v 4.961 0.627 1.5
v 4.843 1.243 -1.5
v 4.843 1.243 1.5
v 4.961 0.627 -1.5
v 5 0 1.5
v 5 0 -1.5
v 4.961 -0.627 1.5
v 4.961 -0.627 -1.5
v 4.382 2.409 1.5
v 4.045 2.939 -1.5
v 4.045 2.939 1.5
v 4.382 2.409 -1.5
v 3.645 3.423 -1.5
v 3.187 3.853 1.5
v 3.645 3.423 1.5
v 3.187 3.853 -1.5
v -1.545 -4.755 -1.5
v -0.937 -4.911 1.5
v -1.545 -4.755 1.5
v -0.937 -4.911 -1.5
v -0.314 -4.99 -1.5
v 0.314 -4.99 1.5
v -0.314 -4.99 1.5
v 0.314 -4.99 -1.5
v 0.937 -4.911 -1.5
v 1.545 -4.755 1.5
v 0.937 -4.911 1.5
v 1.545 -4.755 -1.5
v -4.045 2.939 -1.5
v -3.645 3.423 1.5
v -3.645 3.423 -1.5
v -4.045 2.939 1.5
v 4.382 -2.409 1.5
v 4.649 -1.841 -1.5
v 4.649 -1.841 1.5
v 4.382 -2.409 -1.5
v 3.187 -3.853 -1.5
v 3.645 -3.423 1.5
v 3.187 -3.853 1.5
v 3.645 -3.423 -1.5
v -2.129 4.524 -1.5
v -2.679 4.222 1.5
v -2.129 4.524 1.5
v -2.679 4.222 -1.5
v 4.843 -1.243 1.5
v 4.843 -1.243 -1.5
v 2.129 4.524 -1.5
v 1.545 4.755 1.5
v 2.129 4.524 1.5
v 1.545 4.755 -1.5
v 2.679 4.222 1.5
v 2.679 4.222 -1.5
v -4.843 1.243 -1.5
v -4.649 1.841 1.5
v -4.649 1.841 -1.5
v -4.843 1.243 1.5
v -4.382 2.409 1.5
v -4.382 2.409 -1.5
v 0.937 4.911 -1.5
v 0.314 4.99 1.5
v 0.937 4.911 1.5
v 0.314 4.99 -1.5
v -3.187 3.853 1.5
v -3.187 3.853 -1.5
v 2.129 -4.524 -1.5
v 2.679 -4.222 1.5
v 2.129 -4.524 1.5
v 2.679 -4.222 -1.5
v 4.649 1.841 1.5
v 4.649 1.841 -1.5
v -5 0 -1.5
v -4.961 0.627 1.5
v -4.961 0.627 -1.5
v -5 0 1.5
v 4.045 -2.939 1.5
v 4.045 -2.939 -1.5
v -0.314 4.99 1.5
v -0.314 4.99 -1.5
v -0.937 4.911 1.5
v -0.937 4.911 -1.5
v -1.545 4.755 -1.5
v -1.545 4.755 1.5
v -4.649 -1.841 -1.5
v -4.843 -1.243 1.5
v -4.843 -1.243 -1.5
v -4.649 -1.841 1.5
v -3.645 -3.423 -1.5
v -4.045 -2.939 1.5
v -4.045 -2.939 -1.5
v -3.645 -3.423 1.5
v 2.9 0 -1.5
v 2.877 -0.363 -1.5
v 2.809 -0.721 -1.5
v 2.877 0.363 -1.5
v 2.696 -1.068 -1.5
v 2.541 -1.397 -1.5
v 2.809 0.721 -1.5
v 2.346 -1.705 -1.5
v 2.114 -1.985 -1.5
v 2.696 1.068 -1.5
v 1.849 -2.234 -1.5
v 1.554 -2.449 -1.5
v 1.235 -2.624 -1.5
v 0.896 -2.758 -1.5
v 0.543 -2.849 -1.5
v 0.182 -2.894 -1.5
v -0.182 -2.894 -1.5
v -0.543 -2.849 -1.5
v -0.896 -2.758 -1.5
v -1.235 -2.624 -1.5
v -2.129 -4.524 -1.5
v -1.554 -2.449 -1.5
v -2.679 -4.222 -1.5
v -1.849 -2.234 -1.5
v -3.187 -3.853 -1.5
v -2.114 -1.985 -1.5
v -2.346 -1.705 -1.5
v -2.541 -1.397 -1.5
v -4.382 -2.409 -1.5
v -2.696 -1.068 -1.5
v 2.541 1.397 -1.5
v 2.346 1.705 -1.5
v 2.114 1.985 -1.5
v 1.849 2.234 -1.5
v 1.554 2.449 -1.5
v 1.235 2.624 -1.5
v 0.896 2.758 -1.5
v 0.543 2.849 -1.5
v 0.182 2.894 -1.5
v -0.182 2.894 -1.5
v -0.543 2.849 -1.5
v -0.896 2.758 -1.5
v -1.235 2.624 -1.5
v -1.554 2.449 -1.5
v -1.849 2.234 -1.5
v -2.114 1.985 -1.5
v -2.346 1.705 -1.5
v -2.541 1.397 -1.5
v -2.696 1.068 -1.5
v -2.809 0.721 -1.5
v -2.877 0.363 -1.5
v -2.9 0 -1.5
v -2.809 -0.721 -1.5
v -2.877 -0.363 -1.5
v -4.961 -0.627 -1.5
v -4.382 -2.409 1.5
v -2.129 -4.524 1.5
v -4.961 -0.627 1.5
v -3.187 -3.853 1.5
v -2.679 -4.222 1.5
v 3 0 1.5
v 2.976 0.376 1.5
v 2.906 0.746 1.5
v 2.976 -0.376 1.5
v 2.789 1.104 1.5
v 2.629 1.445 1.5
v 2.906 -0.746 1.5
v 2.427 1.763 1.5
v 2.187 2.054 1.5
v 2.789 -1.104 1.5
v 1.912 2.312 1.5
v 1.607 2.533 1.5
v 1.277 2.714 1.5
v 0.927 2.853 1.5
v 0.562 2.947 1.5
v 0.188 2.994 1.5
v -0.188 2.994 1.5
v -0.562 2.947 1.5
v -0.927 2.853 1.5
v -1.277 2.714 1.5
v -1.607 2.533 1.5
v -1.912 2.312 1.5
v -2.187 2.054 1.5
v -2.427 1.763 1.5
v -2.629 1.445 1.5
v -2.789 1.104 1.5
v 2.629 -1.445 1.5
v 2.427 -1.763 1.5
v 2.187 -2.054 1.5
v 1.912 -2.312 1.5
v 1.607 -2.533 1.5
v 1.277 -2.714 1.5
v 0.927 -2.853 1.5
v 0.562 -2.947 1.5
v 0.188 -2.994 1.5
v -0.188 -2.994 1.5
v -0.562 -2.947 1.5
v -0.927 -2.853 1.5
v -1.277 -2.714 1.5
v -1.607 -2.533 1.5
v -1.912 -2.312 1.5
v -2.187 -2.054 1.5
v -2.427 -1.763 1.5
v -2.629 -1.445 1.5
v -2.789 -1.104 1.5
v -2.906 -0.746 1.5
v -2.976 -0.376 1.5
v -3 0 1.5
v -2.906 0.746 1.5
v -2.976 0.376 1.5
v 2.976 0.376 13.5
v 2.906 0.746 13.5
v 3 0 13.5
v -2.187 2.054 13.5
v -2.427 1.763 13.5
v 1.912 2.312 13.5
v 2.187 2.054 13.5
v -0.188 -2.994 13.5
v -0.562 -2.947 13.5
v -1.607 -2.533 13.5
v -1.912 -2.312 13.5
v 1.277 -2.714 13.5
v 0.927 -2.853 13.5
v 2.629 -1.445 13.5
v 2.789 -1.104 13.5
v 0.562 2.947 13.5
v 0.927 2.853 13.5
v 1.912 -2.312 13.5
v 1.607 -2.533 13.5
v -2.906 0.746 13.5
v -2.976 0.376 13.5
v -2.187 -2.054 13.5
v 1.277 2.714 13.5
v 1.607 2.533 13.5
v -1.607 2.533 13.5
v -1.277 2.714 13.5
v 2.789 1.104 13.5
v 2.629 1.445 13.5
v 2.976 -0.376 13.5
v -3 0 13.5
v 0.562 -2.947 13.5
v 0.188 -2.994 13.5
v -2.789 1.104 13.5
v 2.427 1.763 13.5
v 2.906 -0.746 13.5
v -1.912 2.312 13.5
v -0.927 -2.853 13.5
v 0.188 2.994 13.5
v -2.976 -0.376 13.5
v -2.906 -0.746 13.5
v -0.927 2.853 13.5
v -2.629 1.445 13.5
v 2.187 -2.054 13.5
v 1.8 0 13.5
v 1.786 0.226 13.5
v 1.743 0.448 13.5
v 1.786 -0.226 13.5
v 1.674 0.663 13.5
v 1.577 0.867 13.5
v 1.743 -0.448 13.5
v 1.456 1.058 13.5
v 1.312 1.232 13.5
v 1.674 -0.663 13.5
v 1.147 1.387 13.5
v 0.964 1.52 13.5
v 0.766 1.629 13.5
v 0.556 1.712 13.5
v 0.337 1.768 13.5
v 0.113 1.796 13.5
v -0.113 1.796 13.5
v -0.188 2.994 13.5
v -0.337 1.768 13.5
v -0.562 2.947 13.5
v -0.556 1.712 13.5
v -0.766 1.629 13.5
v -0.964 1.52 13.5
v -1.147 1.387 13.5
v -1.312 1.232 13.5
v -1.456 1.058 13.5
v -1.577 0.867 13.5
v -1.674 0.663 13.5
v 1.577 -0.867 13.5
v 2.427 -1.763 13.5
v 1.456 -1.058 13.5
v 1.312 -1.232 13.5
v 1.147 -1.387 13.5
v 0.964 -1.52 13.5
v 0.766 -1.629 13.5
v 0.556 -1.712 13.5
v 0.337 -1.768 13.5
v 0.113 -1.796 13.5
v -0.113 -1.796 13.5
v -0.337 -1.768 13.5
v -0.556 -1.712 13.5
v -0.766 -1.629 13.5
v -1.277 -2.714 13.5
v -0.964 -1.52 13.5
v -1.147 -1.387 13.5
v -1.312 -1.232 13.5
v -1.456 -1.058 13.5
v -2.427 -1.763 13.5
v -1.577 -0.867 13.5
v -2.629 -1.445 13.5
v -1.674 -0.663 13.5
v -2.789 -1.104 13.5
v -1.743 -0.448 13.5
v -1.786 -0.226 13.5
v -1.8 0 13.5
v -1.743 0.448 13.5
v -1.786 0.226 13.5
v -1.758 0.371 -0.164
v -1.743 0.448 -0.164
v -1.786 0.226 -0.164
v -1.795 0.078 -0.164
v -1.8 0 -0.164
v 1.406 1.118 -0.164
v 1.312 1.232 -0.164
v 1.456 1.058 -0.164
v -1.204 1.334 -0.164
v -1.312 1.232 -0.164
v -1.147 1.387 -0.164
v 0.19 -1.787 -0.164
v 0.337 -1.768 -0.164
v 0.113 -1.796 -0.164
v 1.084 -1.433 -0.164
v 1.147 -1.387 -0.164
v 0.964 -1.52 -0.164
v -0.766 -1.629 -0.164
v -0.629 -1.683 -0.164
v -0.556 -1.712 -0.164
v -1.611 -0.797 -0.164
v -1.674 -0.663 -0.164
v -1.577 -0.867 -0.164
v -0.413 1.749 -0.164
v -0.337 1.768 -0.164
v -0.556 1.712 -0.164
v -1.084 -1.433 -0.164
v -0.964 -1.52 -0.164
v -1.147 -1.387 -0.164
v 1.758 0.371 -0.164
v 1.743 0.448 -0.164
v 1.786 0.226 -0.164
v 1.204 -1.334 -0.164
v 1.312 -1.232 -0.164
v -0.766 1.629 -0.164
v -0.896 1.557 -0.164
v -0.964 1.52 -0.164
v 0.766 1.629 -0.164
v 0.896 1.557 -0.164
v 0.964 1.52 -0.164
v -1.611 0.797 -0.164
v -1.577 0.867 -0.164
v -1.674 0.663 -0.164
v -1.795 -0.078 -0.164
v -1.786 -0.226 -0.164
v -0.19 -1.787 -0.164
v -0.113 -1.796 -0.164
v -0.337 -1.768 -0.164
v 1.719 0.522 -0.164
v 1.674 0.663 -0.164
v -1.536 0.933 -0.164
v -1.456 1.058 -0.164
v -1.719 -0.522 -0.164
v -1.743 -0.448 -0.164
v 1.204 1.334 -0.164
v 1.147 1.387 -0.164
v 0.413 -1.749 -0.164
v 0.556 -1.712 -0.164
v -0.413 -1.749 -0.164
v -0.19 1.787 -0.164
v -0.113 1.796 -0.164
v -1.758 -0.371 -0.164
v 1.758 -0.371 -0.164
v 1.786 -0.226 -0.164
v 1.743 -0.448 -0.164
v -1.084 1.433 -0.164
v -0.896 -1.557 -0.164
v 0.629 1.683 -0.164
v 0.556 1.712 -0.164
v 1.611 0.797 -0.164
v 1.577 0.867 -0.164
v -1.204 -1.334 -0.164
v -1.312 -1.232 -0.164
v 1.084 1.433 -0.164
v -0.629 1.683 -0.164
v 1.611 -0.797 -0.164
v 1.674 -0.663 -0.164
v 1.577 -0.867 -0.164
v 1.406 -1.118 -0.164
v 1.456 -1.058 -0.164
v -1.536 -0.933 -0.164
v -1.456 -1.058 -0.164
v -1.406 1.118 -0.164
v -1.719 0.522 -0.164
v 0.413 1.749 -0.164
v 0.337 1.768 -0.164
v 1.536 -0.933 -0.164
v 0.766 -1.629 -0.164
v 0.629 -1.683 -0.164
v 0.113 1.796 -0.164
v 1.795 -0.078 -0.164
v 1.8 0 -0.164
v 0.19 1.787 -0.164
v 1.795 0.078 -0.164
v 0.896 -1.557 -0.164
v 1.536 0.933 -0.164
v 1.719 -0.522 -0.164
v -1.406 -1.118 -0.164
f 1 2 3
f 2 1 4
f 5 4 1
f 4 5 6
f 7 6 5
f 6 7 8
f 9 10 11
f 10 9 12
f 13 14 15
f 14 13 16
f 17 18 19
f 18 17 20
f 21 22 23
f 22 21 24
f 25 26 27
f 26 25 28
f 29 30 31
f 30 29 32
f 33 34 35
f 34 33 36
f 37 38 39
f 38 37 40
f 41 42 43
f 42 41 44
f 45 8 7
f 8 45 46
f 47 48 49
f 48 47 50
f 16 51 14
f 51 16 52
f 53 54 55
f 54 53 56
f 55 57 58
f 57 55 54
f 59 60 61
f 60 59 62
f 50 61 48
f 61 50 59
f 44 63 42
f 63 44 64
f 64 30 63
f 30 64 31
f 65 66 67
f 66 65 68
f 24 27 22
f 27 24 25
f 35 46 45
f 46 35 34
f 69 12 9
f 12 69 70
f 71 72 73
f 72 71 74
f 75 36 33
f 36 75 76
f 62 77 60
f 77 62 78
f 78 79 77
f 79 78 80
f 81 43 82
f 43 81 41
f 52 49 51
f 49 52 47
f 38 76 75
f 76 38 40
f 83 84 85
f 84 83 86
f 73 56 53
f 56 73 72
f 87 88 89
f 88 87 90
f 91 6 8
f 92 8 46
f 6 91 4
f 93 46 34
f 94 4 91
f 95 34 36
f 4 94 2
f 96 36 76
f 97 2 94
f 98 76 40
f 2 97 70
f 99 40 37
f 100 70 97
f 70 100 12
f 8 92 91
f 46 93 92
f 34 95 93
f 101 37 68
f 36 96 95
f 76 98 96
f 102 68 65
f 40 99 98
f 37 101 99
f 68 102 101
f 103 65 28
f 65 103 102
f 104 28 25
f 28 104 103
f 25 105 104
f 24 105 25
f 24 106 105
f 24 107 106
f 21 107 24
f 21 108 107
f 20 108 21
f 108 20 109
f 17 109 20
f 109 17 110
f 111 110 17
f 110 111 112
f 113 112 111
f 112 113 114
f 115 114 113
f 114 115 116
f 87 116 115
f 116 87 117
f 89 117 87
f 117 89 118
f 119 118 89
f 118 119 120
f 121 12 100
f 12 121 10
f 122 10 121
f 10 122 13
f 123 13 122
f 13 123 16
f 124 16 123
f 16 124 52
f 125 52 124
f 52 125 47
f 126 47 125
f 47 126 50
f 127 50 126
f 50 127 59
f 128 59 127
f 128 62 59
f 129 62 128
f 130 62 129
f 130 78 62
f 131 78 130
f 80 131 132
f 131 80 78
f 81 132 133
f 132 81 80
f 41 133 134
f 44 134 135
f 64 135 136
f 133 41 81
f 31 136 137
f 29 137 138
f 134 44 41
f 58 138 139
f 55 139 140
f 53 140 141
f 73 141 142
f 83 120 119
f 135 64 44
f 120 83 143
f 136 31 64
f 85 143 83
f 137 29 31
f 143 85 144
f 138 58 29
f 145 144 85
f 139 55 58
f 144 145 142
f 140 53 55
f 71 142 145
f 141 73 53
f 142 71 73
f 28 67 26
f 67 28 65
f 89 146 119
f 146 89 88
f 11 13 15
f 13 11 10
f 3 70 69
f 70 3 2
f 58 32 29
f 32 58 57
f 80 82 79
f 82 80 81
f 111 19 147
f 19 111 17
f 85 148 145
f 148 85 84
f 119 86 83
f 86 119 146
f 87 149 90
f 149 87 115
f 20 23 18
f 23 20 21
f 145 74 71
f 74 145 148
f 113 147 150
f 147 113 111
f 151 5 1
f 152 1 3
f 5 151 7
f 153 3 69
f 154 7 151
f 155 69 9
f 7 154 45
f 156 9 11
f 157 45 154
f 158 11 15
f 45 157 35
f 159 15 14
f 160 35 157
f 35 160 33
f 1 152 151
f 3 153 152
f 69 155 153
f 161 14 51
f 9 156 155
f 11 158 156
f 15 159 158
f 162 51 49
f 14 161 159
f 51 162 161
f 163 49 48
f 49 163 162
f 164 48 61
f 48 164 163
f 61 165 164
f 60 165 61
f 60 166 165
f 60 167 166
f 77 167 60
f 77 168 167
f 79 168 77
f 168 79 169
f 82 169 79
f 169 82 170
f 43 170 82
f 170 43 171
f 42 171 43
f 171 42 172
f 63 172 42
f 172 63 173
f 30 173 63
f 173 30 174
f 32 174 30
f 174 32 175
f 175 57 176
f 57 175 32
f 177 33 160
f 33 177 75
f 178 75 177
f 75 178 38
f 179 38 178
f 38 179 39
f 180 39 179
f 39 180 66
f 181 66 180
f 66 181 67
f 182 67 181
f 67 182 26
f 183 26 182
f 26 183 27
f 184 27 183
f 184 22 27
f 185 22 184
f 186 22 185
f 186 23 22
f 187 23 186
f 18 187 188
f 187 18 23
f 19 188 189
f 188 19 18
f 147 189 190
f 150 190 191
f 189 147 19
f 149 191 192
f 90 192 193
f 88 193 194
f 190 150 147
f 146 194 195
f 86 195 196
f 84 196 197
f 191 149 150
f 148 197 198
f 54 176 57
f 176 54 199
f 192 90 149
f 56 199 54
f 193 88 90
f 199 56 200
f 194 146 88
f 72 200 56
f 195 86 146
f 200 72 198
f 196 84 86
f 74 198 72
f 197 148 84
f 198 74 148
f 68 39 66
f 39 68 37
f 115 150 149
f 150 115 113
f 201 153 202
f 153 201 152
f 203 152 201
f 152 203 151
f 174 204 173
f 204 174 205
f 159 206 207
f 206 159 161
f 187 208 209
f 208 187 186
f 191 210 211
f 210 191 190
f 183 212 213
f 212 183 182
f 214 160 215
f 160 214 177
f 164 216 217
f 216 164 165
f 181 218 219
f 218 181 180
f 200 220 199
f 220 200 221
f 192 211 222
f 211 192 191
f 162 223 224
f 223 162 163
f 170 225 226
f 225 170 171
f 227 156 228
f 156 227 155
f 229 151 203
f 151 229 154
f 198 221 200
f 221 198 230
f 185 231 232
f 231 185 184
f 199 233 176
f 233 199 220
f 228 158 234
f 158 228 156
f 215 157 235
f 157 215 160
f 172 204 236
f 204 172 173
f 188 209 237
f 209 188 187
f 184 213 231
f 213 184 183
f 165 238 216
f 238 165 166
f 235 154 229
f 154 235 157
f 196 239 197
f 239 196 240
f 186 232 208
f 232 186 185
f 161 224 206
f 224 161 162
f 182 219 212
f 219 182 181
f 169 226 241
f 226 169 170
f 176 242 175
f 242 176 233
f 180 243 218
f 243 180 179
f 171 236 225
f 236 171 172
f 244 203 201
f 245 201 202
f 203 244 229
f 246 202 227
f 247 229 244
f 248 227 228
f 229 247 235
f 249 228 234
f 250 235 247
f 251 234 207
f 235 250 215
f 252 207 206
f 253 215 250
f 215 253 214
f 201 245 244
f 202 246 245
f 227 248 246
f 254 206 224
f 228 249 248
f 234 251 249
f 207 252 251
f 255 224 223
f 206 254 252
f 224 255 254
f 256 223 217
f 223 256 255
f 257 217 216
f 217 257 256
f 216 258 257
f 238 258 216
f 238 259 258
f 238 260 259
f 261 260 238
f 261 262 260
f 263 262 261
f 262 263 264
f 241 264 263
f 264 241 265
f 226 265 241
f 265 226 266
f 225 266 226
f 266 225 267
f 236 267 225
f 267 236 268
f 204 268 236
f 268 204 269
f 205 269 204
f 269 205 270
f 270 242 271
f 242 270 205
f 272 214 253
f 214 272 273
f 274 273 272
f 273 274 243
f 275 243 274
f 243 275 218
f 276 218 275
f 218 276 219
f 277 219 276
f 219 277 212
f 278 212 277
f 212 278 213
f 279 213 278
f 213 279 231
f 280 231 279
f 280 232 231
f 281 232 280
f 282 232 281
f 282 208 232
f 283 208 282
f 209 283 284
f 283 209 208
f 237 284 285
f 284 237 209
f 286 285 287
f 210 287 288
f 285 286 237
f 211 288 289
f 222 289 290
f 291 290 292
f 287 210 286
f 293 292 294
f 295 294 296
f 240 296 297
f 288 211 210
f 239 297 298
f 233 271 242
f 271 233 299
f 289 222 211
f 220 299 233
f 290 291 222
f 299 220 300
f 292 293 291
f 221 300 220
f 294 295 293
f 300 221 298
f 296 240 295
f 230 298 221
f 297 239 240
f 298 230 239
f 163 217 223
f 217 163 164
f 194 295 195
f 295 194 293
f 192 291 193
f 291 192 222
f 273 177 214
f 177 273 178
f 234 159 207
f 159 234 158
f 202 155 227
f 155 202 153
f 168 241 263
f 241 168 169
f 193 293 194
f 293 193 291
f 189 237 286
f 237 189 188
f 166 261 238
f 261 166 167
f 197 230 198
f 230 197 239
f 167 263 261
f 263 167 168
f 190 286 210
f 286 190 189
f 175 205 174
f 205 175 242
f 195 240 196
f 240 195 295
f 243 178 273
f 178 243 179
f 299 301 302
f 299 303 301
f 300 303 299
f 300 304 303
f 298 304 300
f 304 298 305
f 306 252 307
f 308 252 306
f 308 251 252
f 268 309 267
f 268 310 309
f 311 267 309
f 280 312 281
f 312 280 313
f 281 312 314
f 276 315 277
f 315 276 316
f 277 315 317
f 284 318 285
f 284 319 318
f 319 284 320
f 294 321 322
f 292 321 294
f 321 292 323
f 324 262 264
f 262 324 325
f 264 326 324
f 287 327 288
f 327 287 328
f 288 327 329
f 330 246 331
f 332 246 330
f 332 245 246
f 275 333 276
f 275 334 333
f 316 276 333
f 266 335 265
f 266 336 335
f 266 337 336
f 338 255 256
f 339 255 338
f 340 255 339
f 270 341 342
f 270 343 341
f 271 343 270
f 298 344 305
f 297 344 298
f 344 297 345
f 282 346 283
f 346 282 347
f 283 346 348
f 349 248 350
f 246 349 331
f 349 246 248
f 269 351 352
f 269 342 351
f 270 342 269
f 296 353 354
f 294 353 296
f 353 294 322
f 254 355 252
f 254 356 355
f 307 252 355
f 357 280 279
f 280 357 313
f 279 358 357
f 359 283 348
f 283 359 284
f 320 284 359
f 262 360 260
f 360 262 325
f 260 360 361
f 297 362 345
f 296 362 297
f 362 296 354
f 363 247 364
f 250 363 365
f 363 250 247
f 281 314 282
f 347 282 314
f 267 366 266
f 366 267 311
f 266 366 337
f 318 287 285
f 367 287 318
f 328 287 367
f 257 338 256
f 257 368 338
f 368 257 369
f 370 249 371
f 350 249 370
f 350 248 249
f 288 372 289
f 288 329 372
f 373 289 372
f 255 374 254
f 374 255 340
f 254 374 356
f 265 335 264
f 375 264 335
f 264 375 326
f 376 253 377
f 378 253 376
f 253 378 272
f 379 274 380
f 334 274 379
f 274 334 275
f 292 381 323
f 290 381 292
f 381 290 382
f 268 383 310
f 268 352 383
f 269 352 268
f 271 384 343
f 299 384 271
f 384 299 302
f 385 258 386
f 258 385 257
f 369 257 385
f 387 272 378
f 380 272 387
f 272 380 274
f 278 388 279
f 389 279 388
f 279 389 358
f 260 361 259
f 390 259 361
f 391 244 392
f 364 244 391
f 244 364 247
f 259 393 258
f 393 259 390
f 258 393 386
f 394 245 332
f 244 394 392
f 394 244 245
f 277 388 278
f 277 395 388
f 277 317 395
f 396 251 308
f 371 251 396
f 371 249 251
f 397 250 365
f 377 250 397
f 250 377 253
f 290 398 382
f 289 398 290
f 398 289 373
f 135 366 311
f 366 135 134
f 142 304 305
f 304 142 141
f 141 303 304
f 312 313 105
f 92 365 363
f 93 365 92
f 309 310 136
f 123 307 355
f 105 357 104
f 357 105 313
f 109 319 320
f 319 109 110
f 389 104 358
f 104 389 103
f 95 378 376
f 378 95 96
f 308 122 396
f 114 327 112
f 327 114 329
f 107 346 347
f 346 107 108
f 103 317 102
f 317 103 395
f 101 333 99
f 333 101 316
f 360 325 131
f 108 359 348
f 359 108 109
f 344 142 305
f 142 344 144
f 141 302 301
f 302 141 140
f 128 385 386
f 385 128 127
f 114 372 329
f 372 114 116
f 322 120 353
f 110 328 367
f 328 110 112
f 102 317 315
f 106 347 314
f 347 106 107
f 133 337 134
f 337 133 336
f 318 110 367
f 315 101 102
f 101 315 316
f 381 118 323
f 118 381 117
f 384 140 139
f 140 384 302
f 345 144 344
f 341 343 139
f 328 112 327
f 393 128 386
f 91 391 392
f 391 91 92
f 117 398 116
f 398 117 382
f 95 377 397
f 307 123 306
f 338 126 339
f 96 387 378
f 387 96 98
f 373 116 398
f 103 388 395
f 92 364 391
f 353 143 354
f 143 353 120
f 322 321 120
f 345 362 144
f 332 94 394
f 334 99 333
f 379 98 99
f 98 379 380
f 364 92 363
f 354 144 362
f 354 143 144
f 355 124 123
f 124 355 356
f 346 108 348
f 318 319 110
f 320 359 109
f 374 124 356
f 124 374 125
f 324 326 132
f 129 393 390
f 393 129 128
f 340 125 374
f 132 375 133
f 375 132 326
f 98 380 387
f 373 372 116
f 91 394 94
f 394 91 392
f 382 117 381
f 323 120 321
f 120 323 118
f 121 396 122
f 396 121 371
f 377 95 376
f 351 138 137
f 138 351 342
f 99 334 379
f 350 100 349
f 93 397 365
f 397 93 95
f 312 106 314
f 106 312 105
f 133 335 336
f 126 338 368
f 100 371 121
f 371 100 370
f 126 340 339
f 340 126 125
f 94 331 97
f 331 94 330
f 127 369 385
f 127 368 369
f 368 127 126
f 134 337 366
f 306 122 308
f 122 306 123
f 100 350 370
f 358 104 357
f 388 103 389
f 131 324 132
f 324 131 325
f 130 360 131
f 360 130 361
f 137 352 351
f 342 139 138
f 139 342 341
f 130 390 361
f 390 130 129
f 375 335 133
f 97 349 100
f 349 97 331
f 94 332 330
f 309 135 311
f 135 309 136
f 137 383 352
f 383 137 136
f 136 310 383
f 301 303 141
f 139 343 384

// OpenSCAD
$fn = 50;


difference() {
	union() {
		translate(v = [0, 0, -1.5000000000]) {
			cylinder(h = 3, r = 5.0000000000);
		}
		translate(v = [0, 0, -1.5000000000]) {
			cylinder(h = 15, r = 3.0000000000);
		}
	}
	union() {
		translate(v = [0, 0, -1.5000000000]) {
			rotate(a = [0, 180, 0]) {
				difference() {
					union() {
						translate(v = [0, 0, -15.0000000000]) {
							cylinder(h = 15, r = 1.5000000000);
						}
						translate(v = [0, 0, -15.0000000000]) {
							cylinder(h = 15, r = 1.8000000000);
						}
						translate(v = [0, 0, -1.7000000000]) {
							cylinder(h = 1.7000000000, r1 = 1.5000000000, r2 = 2.9000000000);
						}
						translate(v = [0, 0, -15.0000000000]) {
							cylinder(h = 15, r = 1.5000000000);
						}
					}
					union();
				}
			}
		}
		translate(v = [0, 0, -100.0000000000]) {
			cylinder(h = 200, r = 1.5000000000);
		}
	}
}
